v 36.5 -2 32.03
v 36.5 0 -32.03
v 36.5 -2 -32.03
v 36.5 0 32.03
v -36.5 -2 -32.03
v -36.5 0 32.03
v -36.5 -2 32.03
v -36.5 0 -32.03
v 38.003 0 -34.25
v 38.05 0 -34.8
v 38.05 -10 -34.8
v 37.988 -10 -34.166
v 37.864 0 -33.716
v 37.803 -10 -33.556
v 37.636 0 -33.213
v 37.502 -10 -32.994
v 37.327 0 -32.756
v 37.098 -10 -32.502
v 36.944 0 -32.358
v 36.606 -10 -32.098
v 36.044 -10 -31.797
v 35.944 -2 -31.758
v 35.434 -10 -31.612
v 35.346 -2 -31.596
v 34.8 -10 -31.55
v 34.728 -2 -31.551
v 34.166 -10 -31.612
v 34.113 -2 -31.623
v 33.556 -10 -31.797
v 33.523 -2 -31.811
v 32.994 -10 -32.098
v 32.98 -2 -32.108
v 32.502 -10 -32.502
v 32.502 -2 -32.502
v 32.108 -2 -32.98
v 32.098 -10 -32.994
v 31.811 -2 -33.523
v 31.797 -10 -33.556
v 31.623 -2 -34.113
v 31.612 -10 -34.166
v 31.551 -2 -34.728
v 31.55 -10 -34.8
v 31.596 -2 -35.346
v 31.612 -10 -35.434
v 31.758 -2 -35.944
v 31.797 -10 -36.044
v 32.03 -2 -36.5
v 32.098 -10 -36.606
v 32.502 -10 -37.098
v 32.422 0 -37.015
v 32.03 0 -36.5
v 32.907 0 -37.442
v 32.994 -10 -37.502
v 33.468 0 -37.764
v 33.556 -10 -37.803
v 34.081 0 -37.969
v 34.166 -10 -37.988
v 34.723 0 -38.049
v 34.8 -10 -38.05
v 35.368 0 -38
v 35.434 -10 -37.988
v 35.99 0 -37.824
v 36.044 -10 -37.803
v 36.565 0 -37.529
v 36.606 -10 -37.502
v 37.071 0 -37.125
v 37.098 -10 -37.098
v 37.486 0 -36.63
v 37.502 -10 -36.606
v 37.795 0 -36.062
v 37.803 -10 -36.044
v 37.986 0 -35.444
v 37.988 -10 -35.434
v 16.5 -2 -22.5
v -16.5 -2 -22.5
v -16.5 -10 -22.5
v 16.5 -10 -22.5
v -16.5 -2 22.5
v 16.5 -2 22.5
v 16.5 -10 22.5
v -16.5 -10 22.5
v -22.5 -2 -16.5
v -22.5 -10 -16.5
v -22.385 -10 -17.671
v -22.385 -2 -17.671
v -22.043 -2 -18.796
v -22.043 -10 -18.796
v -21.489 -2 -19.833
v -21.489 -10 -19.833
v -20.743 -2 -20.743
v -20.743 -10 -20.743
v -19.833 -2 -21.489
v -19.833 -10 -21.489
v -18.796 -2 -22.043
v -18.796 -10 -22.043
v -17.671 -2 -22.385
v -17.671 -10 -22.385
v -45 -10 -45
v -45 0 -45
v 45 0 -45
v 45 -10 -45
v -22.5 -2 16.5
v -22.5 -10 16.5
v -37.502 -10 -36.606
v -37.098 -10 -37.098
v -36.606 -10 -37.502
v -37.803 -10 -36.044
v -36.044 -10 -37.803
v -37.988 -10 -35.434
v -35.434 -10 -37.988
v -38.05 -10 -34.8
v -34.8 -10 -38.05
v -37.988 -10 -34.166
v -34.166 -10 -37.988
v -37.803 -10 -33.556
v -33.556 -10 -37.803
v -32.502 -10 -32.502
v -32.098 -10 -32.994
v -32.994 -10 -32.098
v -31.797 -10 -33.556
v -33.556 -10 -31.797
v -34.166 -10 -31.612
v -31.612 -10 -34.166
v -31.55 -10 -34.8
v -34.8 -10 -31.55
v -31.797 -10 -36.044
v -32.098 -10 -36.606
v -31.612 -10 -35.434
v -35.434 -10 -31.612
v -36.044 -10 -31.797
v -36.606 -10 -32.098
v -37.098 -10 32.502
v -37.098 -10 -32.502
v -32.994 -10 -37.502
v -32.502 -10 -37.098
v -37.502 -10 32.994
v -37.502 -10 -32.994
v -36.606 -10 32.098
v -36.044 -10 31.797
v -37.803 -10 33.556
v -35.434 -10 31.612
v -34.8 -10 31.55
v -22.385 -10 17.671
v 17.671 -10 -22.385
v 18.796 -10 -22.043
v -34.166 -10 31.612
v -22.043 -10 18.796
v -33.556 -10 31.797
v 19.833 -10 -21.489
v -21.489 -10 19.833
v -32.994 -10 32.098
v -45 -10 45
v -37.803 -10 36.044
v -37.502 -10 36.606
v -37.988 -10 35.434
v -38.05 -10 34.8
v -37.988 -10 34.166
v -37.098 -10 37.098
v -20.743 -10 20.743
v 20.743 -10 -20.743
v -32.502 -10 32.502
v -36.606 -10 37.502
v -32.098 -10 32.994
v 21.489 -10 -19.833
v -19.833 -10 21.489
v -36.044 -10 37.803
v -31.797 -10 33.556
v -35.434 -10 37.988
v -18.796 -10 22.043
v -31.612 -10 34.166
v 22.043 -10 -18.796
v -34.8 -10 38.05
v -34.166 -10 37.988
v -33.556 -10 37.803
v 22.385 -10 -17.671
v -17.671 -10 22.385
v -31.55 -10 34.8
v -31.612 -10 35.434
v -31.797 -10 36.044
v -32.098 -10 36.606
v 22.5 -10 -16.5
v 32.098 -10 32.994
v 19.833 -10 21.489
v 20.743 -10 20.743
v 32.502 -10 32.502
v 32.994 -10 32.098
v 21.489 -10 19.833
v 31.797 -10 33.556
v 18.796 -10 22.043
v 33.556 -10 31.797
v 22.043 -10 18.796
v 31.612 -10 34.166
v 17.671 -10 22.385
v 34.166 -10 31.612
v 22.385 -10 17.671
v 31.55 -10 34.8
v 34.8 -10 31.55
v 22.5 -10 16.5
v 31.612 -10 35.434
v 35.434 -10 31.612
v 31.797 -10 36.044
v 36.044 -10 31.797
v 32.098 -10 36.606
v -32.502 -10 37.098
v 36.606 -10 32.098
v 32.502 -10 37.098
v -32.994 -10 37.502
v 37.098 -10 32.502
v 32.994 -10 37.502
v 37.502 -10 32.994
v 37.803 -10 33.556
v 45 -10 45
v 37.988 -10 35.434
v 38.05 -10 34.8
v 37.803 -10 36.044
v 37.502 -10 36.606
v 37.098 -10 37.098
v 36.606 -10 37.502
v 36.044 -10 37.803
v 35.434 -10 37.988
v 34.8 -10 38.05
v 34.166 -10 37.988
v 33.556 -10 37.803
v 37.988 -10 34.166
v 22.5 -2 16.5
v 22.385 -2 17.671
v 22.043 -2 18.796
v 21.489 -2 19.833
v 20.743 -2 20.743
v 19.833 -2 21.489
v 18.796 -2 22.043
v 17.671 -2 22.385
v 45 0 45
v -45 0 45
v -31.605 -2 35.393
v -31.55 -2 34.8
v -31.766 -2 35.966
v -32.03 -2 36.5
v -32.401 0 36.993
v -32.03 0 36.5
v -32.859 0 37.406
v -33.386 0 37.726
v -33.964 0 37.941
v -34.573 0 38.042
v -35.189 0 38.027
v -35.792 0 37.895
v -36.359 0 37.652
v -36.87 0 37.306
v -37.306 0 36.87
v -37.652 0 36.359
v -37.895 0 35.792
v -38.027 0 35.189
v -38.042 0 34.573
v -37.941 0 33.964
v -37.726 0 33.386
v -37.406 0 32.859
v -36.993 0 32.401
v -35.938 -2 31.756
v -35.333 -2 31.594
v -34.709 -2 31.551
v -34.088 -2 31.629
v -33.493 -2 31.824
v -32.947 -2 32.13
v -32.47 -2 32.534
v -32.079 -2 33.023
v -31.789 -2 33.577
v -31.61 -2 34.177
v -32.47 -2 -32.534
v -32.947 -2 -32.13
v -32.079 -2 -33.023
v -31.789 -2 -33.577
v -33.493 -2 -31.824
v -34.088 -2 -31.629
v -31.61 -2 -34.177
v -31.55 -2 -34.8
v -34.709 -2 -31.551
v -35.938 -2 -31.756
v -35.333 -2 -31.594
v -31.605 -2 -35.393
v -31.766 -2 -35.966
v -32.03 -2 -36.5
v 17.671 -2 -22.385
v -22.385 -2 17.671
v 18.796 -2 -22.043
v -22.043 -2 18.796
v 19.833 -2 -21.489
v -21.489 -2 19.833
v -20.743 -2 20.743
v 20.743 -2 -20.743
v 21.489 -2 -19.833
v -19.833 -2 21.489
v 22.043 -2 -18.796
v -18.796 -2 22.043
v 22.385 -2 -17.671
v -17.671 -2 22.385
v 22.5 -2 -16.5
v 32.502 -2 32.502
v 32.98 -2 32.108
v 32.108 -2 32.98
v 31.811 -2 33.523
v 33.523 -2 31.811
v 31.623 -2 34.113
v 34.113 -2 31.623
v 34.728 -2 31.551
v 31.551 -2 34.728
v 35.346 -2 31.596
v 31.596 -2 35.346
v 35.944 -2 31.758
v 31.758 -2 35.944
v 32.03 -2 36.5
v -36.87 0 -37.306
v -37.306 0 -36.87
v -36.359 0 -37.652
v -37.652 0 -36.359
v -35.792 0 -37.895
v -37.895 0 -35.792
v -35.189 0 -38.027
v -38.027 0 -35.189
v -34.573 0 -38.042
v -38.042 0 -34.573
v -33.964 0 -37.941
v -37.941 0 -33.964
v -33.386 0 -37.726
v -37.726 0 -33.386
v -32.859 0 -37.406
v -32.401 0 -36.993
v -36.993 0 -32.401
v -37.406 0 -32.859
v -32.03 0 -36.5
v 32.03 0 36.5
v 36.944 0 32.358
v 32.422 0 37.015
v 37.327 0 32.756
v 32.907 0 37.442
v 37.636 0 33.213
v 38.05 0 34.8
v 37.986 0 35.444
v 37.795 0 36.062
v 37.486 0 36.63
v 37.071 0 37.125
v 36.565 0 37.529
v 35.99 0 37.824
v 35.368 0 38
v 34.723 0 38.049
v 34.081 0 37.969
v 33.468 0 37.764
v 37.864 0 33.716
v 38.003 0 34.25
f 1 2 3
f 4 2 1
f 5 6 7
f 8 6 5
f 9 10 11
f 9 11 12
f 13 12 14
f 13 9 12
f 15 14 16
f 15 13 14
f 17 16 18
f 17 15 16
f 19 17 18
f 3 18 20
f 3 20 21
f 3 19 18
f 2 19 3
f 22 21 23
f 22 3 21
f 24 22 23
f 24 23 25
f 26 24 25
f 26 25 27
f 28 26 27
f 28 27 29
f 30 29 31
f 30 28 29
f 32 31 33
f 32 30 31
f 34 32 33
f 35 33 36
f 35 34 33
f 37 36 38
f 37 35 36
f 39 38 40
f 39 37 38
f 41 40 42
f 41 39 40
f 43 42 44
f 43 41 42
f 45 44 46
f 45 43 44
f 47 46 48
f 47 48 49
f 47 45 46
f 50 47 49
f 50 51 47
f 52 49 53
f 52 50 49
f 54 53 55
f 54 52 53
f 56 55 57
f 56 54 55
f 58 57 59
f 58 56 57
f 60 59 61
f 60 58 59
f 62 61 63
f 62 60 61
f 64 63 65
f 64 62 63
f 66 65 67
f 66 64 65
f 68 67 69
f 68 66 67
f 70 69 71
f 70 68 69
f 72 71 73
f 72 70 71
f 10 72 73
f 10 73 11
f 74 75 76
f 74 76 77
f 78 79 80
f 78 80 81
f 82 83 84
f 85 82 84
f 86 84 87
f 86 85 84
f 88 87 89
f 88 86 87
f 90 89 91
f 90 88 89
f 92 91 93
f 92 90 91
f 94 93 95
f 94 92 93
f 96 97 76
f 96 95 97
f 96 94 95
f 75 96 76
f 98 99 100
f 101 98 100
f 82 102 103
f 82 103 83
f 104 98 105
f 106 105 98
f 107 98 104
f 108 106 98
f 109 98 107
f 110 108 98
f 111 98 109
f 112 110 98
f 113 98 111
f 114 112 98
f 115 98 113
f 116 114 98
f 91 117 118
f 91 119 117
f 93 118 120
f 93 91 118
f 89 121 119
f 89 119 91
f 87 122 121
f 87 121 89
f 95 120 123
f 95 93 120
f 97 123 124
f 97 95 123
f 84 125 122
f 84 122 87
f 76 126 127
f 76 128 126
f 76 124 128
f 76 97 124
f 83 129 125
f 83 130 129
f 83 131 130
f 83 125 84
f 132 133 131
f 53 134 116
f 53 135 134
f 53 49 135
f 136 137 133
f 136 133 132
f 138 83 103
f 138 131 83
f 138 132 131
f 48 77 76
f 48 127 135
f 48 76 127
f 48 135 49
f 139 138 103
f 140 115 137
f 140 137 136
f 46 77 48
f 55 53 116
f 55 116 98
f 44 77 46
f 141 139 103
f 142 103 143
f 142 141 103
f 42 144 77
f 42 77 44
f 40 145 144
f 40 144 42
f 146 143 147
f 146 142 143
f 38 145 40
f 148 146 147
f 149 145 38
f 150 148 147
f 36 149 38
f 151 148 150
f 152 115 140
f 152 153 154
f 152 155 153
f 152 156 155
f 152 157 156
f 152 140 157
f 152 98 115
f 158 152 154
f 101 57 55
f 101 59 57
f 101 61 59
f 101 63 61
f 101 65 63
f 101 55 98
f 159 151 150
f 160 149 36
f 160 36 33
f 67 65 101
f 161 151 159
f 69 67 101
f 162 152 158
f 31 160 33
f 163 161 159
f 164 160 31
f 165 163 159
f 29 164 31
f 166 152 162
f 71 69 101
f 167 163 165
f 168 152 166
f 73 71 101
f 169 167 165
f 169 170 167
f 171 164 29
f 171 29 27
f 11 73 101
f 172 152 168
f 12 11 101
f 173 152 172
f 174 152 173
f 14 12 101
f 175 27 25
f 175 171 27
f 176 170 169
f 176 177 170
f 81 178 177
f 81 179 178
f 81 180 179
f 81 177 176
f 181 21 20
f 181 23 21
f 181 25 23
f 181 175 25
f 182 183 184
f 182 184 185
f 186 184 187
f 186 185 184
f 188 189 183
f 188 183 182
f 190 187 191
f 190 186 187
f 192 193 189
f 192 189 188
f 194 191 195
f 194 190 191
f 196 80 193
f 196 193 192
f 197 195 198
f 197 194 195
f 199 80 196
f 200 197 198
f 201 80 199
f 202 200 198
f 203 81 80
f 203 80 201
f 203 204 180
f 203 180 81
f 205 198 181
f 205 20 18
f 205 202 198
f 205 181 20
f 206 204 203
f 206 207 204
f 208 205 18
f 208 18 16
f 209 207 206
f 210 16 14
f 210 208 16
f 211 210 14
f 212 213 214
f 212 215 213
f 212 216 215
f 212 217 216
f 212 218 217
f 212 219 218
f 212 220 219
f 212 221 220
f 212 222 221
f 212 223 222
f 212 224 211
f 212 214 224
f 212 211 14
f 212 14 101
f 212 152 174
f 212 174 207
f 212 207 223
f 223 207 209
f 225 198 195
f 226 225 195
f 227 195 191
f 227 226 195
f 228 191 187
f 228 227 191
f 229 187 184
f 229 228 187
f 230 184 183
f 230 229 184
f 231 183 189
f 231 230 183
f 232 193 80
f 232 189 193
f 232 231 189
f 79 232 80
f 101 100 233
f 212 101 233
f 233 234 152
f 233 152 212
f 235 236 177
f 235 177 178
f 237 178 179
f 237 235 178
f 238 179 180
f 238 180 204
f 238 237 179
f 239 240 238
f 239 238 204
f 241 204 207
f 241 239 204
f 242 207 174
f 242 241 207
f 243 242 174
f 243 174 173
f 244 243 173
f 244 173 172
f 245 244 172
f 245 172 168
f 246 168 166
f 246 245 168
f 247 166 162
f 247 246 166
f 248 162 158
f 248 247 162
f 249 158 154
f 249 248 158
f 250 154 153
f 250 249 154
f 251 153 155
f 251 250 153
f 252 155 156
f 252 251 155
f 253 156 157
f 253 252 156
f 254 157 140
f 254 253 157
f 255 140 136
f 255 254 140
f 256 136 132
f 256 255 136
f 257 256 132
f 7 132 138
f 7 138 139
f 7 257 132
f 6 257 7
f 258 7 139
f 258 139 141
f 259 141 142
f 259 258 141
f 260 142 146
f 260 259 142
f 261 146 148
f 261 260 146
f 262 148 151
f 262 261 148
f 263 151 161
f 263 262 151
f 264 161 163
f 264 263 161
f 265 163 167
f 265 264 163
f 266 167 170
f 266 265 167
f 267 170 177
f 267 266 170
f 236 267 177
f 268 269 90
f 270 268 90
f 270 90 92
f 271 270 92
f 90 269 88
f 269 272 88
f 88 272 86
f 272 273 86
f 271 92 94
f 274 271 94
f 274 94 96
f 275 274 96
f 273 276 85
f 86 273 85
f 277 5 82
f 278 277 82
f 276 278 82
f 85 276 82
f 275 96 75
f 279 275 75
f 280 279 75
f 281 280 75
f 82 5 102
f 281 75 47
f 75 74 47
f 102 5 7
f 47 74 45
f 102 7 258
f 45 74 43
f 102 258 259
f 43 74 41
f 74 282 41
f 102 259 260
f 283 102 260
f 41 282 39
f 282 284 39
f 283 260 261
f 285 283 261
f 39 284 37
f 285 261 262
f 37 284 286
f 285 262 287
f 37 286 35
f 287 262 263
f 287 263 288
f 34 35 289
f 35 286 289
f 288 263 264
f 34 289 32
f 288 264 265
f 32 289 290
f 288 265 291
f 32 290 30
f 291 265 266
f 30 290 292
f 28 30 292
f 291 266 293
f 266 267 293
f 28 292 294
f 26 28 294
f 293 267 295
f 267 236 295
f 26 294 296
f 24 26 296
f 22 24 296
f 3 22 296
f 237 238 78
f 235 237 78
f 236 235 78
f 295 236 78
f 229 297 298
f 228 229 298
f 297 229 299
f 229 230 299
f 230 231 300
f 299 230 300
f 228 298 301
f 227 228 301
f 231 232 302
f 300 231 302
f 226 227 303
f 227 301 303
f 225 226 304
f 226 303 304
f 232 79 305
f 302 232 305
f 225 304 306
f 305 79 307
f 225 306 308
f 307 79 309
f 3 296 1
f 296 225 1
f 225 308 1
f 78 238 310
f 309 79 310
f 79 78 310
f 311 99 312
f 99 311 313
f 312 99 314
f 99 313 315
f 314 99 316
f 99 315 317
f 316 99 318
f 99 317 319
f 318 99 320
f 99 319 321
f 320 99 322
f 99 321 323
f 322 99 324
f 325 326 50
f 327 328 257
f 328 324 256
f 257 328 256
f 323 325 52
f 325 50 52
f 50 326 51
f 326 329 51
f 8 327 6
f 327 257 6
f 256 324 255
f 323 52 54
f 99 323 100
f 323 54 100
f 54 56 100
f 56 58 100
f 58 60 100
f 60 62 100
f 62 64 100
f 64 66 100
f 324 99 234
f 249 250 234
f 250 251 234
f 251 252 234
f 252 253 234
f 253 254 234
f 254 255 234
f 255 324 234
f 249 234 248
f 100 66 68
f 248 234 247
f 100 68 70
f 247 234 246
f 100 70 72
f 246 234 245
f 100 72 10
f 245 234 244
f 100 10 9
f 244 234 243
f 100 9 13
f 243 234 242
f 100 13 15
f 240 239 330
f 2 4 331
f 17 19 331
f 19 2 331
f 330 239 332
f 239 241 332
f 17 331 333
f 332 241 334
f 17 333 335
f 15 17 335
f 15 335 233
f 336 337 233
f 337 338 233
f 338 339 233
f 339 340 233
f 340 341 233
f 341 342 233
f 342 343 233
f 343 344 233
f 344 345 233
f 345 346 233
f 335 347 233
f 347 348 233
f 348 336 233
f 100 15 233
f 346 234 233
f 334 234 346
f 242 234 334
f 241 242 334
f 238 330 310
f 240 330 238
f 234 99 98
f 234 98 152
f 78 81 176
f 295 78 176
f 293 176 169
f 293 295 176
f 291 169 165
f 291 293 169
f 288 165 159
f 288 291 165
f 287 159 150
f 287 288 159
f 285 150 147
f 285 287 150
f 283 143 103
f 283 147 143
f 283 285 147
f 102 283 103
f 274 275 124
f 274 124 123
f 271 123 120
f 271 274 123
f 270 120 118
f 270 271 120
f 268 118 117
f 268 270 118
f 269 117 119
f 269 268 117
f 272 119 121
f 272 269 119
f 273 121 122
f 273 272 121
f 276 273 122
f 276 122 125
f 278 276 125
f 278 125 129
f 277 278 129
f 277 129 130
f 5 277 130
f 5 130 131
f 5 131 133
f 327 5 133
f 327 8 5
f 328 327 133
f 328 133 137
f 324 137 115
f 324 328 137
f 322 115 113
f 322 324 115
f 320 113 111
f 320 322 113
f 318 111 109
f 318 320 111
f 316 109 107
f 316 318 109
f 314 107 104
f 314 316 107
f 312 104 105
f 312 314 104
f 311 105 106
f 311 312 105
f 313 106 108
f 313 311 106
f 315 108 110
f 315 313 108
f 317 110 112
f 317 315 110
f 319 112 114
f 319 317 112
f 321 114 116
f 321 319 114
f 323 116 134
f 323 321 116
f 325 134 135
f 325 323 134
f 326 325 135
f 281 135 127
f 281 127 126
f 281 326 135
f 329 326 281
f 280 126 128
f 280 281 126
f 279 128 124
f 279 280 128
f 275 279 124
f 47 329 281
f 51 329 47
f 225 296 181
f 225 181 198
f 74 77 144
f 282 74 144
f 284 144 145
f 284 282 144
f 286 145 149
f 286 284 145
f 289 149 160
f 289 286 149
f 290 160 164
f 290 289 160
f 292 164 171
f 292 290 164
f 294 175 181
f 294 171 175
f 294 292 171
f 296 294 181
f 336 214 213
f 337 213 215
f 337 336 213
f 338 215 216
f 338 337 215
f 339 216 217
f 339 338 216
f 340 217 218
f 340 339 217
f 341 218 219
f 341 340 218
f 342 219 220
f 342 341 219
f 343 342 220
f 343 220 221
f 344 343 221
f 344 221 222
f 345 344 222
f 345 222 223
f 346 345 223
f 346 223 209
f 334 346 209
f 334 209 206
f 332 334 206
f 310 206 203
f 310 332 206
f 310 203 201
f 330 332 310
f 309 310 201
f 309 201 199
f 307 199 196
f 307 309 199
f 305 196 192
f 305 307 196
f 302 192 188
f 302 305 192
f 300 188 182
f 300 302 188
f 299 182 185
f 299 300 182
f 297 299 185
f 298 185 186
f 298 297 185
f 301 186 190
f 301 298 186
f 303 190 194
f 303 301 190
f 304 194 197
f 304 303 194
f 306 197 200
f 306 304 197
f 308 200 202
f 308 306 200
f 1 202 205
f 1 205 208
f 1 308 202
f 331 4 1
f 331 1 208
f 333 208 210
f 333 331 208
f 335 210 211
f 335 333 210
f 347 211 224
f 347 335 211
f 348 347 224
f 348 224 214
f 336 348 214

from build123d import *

# Parameters (mm, degrees)
F0_W     = 90
F0_H     = 90
F0_R     = 3.25
F1_DEPTH = 10
F3_DEPTH = 2
F5_DEPTH = 10.001


with BuildPart() as f1:
    # F0 (on Front) → F1 (new body)
    with BuildSketch(Plane.XZ):
        Rectangle(F0_W, F0_H)
        with Locations((-34.8, -34.8)):
            Circle(F0_R, mode=Mode.SUBTRACT)
        with Locations((34.8, -34.8)):
            Circle(F0_R, mode=Mode.SUBTRACT)
        with Locations((-34.8, 34.8)):
            Circle(F0_R, mode=Mode.SUBTRACT)
        with Locations((34.8, 34.8)):
            Circle(F0_R, mode=Mode.SUBTRACT)
    extrude(amount=F1_DEPTH)

    # F2 (on Front) → F3 (cut)
    with BuildSketch(Plane.XZ):
        with BuildLine():
            ThreePointArc((36.5, 32.5), (35.328427, 35.328427), (32.5, 36.5))
            Line((32.5, 36.5), (-32.5, 36.5))
            ThreePointArc((-32.5, 36.5), (-35.328427, 35.328427), (-36.5, 32.5))
            Line((-36.5, 32.5), (-36.5, -32.5))
            ThreePointArc((-36.5, -32.5), (-35.328427, -35.328427), (-32.5, -36.5))
            Line((-32.5, -36.5), (32.5, -36.5))
            ThreePointArc((32.5, -36.5), (35.328427, -35.328427), (36.5, -32.5))
            Line((36.5, -32.5), (36.5, 32.5))
        make_face()
    extrude(amount=F3_DEPTH, mode=Mode.SUBTRACT)

    # F4 (on Front) → F5 (cut, through all)
    with BuildSketch(Plane.XZ):
        with BuildLine():
            ThreePointArc((22.5, 16.5), (20.742641, 20.742641), (16.5, 22.5))
            Line((16.5, 22.5), (-16.5, 22.5))
            ThreePointArc((-16.5, 22.5), (-20.742641, 20.742641), (-22.5, 16.5))
            Line((-22.5, 16.5), (-22.5, -16.5))
            ThreePointArc((-22.5, -16.5), (-20.742641, -20.742641), (-16.5, -22.5))
            Line((-16.5, -22.5), (16.5, -22.5))
            ThreePointArc((16.5, -22.5), (20.742641, -20.742641), (22.5, -16.5))
            Line((22.5, -16.5), (22.5, 16.5))
        make_face()
    extrude(amount=F5_DEPTH, mode=Mode.SUBTRACT)


solid = f1.part
